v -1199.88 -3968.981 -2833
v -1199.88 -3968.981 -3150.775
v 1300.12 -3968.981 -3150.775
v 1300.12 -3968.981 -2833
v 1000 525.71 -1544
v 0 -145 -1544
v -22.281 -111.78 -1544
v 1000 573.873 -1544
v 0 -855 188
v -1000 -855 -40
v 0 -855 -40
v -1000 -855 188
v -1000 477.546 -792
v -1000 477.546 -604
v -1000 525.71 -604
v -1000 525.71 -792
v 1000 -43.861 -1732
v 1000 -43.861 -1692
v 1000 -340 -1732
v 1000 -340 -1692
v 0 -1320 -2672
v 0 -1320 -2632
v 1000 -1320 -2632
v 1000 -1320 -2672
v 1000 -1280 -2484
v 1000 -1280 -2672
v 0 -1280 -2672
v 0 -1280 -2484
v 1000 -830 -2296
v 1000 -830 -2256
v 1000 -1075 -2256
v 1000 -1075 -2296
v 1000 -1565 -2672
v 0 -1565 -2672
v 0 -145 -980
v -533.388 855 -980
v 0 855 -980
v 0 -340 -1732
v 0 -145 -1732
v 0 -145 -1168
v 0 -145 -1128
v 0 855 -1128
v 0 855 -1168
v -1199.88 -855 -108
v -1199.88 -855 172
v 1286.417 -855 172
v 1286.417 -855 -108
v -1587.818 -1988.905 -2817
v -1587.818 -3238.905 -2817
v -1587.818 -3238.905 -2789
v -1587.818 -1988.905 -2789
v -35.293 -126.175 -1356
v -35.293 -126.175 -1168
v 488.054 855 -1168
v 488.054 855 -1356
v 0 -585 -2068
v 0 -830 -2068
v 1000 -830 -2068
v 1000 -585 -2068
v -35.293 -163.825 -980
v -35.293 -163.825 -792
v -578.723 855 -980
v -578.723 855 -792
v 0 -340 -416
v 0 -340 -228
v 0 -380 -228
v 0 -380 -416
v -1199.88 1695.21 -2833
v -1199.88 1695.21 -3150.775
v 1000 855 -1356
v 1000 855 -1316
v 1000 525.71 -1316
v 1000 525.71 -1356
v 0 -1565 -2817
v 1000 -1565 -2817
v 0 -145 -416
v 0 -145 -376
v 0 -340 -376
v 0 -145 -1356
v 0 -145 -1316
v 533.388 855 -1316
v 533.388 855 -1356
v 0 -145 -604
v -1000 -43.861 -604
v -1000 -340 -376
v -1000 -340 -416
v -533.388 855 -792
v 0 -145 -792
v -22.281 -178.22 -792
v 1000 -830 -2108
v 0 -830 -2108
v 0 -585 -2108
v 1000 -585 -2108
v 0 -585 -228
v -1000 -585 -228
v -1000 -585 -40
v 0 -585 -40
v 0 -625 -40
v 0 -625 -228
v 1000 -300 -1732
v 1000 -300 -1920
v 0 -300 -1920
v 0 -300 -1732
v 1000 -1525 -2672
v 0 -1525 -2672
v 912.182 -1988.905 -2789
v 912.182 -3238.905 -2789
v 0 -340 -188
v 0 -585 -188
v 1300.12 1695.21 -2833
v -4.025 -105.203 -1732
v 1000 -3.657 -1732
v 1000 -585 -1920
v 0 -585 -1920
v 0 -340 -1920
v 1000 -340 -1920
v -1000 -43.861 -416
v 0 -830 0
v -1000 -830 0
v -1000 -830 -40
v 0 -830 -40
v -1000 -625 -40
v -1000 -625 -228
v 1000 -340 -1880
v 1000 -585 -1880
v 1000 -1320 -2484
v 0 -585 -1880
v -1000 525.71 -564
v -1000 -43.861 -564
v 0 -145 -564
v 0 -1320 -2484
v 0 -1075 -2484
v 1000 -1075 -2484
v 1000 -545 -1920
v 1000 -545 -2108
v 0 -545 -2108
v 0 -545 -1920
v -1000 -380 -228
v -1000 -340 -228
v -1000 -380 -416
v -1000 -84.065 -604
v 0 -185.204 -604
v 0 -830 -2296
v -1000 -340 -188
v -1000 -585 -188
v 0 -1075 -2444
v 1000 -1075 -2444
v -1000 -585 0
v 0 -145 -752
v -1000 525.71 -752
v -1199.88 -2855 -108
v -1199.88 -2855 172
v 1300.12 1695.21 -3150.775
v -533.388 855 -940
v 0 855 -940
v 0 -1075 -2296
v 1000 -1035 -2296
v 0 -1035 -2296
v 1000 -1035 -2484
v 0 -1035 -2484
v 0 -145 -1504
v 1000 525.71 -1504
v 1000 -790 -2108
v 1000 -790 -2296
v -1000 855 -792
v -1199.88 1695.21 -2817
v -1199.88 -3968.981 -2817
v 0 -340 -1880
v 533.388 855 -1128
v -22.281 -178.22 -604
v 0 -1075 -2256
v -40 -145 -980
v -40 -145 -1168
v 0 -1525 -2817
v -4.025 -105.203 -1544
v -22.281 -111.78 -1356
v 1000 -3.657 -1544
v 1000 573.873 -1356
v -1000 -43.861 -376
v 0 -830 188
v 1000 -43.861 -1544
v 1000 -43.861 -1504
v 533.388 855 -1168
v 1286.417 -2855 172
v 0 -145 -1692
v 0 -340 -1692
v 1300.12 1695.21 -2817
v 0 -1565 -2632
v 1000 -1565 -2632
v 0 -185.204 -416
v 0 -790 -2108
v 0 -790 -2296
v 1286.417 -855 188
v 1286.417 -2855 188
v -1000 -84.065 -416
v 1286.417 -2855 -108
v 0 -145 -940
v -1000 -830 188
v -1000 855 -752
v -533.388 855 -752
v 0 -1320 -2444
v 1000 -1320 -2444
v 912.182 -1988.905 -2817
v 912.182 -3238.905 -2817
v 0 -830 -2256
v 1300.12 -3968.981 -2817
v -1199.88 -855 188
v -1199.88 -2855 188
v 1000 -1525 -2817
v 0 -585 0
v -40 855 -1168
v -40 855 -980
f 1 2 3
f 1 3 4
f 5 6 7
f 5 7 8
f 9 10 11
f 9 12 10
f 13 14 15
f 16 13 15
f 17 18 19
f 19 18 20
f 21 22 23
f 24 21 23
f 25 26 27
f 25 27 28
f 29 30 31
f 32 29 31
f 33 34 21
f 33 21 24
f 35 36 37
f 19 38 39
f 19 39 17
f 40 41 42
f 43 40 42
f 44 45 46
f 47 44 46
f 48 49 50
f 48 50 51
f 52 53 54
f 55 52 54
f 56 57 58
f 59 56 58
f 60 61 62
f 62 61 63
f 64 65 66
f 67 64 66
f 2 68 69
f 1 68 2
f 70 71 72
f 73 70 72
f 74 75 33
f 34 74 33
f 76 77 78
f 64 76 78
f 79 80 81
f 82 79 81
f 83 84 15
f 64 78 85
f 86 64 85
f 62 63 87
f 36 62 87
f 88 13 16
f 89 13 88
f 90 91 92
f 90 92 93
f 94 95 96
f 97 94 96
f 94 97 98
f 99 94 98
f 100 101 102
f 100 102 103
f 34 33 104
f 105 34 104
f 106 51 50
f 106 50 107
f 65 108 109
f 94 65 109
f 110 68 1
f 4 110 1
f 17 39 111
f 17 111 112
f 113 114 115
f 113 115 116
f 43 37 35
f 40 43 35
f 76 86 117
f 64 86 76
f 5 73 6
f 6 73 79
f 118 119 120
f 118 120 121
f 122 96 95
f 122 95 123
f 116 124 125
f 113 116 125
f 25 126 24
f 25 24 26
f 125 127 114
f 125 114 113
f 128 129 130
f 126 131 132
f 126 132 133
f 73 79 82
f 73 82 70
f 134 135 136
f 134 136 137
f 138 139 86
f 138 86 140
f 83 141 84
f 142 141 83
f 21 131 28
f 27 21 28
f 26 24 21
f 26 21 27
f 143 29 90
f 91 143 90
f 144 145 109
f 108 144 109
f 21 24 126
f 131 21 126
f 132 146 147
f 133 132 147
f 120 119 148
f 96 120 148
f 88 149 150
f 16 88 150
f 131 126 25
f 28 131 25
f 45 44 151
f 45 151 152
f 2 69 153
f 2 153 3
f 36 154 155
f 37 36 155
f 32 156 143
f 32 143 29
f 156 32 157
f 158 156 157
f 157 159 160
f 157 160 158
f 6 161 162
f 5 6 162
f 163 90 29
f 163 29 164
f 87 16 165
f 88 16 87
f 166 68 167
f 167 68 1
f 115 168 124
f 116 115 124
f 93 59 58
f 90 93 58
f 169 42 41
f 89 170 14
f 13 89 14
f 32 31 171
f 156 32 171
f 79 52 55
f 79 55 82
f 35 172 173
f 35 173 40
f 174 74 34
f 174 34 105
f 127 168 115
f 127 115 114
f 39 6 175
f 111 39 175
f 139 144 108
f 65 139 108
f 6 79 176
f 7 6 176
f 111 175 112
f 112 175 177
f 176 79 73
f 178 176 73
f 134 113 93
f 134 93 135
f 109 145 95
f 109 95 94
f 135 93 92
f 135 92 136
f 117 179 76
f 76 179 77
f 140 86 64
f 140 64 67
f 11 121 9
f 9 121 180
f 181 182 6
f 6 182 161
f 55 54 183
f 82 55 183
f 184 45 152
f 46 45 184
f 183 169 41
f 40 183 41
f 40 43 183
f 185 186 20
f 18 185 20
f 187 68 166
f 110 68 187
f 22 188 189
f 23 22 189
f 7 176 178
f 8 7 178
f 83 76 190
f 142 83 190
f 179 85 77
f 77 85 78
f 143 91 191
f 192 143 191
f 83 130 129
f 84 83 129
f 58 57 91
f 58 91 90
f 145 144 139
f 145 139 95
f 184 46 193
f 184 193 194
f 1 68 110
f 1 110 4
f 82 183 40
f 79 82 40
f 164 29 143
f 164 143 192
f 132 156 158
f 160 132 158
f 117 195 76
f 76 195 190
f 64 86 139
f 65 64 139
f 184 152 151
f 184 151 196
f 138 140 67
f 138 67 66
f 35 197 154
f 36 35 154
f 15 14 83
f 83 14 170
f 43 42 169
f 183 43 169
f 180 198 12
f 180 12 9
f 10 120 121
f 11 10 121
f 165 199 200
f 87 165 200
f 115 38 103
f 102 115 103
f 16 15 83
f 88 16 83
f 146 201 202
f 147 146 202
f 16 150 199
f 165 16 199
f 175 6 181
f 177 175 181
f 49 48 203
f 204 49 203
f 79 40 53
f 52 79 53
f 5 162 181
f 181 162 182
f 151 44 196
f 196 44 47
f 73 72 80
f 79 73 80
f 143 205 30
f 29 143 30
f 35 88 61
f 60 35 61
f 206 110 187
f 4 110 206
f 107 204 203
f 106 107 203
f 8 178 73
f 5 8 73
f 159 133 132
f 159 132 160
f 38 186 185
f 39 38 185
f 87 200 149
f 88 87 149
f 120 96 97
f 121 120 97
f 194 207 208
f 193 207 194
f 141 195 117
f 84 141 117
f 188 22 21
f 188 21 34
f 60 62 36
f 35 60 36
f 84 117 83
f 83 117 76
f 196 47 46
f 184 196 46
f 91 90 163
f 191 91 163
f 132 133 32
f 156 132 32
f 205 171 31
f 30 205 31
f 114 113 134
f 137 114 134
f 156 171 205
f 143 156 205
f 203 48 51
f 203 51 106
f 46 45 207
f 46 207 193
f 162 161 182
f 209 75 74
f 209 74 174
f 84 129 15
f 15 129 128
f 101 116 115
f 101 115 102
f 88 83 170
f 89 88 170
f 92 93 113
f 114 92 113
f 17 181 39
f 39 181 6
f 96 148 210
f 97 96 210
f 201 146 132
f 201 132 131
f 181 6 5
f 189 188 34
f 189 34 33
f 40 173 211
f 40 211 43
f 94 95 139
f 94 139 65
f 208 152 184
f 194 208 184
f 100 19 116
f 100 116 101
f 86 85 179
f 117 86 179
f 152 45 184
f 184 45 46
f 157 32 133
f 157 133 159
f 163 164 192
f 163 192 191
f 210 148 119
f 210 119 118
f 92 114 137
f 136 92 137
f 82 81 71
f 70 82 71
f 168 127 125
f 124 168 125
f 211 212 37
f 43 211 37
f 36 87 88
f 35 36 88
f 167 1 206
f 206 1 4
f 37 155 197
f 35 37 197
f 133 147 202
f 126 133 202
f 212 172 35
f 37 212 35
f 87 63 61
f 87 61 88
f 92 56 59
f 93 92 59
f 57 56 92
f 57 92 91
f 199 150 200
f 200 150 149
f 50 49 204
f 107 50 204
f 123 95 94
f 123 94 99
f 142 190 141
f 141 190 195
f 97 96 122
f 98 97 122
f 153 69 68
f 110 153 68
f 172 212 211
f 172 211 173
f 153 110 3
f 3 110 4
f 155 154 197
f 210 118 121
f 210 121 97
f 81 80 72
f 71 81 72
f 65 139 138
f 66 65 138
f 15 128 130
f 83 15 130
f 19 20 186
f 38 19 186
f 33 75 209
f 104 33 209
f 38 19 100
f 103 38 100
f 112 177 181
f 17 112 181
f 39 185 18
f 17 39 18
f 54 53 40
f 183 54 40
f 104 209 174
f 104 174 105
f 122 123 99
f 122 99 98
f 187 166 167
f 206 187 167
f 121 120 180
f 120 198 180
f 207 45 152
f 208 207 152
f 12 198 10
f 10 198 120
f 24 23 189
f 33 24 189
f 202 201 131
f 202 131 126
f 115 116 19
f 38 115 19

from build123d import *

# Parameters (mm, degrees)
F4_W      = 2486.2963052011
F4_H      = 280
F5_DEPTH  = 2000
F6_DEPTH  = 16
F7_W      = 5664.1902506969
F7_H      = 317.7745664499
F8_DEPTH  = 2500
F9_DEPTH  = 16
F2_W      = 1000
F2_H      = 245
F10_DEPTH = 40
F12_W     = 1000
F12_H     = 245
F13_DEPTH = 40
F16_DEPTH = 40
F19_DEPTH = 40
F22_DEPTH = 40
F25_DEPTH = 40
F28_DEPTH = 40
F31_DEPTH = 40
F34_DEPTH = 40
F37_DEPTH = 40
F39_W     = 1000
F39_H     = 245
F40_DEPTH = 40
F42_W     = 1000
F42_H     = 245
F43_DEPTH = 40
F46_DEPTH = 40
F48_W     = 1000
F48_H     = 245
F49_DEPTH = 40
F51_W     = 1000
F51_H     = 245
F52_DEPTH = 40
F53_W     = 1000
F53_H     = 40
F53_H_2   = 188
F54_DEPTH = 25
F55_W     = 40
F55_H     = 188
F56_DEPTH = 1000
F57_W     = 40
F57_H     = 188
F58_DEPTH = 1000
F60_DEPTH = 188
F62_DEPTH = 188
F64_DEPTH = 188
F65_W     = 40
F65_H     = 1000
F66_DEPTH = 188
F68_DEPTH = 188
F70_DEPTH = 188
F72_DEPTH = 188
F73_W     = 40
F73_H     = 188
F74_DEPTH = 1000
F73_H_2   = 145
F75_W     = 2500
F75_H     = 1250
F76_DEPTH = 28


with BuildPart() as f5:
    # F4 (on plane+point) → F5 (new body)
    with BuildSketch(Plane.XZ.offset(855)):
        with Locations((43.2685017586, 32)):
            Rectangle(F4_W, F4_H)
    extrude(amount=F5_DEPTH)


with BuildPart() as f6:
    # F6 (new): a face of the model
    f6_faces = [f5.part.faces().sort_by_distance(p)[0] for p in [
        (43.2685017586, -1855, 172),
    ]]
    extrude(f6_faces, amount=F6_DEPTH)


with BuildPart() as f8:
    # F7 (on face) → F8 (new body)
    with BuildSketch(Plane(origin=(-1199.879650842, 0, 0), x_dir=(0, -1, 0), z_dir=(-1, 0, 0))):
        with Locations((1136.8854641914, -2991.8872832249)):
            Rectangle(F7_W, F7_H)
    extrude(amount=-F8_DEPTH)


with BuildPart() as f9:
    # F9 (new): a face of the model
    f9_faces = [f8.part.faces().sort_by_distance(p)[0] for p in [
        (50.120349158, -1136.8854641914, -2833),
    ]]
    extrude(f9_faces, amount=F9_DEPTH)


with BuildPart() as f10:
    # F2 (on Top) → F10 (new body)
    with BuildSketch(Plane.XY):
        with Locations((-500, -707.5)):
            Rectangle(F2_W, F2_H)
    extrude(amount=-F10_DEPTH)


with BuildPart() as f13:
    # F12 (on offset) → F13 (new body)
    with BuildSketch(Plane(origin=(0, 0, -188), x_dir=(1, 0, 0), z_dir=(0, 0, -1))):
        with Locations((-500, 462.5)):
            Rectangle(F12_W, F12_H)
    extrude(amount=F13_DEPTH)


with BuildPart() as f16:
    # F15 (on offset) → F16 (new body)
    with BuildSketch(Plane(origin=(0, 0, -376), x_dir=(1, 0, 0), z_dir=(0, 0, -1))):
        Polygon((-1000, 340), (-1000, 43.8609200193), (-497.4621748888, 94.6871333065), (0, 145), (0, 340), align=None)
    extrude(amount=F16_DEPTH)


with BuildPart() as f19:
    # F18 (on offset) → F19 (new body)
    with BuildSketch(Plane(origin=(0, 0, -564), x_dir=(1, 0, 0), z_dir=(0, 0, -1))):
        Polygon((-415.248685246, -133.5112733831), (0, 145), (-497.4621748888, 94.6871333065), (-1000, 43.8609200193), (-1000, -525.7095850722), align=None)
    extrude(amount=F19_DEPTH)


with BuildPart() as f22:
    # F21 (on offset) → F22 (new body)
    with BuildSketch(Plane(origin=(0, 0, -752), x_dir=(1, 0, 0), z_dir=(0, 0, -1))):
        Polygon((-415.248685246, -133.5112733831), (-1000, -525.7095850722), (-1000, -855), (-533.3881466372, -855), (-235.3129440856, -296.1664293051), (0, 145), align=None)
    extrude(amount=F22_DEPTH)


with BuildPart() as f25:
    # F24 (on offset) → F25 (new body)
    with BuildSketch(Plane(origin=(0, 0, -940), x_dir=(1, 0, 0), z_dir=(0, 0, -1))):
        Polygon((-533.3881466372, -855), (0, -855), (0, 145), (-235.3129440856, -296.1664293051), align=None)
    extrude(amount=F25_DEPTH)


with BuildPart() as f28:
    # F27 (on offset) → F28 (new body)
    with BuildSketch(Plane(origin=(0, 0, -1128), x_dir=(1, 0, 0), z_dir=(0, 0, -1))):
        Polygon((0, -855), (533.3881466372, -855), (235.3129440856, -296.1664293051), (0, 145), align=None)
    extrude(amount=F28_DEPTH)


with BuildPart() as f31:
    # F30 (on offset) → F31 (new body)
    with BuildSketch(Plane(origin=(0, 0, -1316), x_dir=(1, 0, 0), z_dir=(0, 0, -1))):
        Polygon((415.248685246, -133.5112733831), (0, 145), (235.3129440856, -296.1664293051), (533.3881466372, -855), (1000, -855), (1000, -525.7095850722), align=None)
    extrude(amount=F31_DEPTH)


with BuildPart() as f34:
    # F33 (on offset) → F34 (new body)
    with BuildSketch(Plane(origin=(0, 0, -1504), x_dir=(1, 0, 0), z_dir=(0, 0, -1))):
        Polygon((497.4621748888, 94.6871333065), (0, 145), (415.248685246, -133.5112733831), (1000, -525.7095850722), (1000, 43.8609200193), align=None)
    extrude(amount=F34_DEPTH)


with BuildPart() as f37:
    # F36 (on offset) → F37 (new body)
    with BuildSketch(Plane(origin=(0, 0, -1692), x_dir=(1, 0, 0), z_dir=(0, 0, -1))):
        Polygon((497.4621748888, 94.6871333065), (1000, 43.8609200193), (1000, 340), (0, 340), (0, 145), align=None)
    extrude(amount=F37_DEPTH)


with BuildPart() as f40:
    # F39 (on offset) → F40 (new body)
    with BuildSketch(Plane(origin=(0, 0, -1880), x_dir=(1, 0, 0), z_dir=(0, 0, -1))):
        with Locations((500, 462.5)):
            Rectangle(F39_W, F39_H)
    extrude(amount=F40_DEPTH)


with BuildPart() as f43:
    # F42 (on offset) → F43 (new body)
    with BuildSketch(Plane(origin=(0, 0, -2068), x_dir=(1, 0, 0), z_dir=(0, 0, -1))):
        with Locations((500, 707.5)):
            Rectangle(F42_W, F42_H)
    extrude(amount=F43_DEPTH)


with BuildPart() as f46:
    # F45 (on offset) → F46 (new body)
    with BuildSketch(Plane(origin=(0, 0, -2256), x_dir=(1, 0, 0), z_dir=(0, 0, -1))):
        Polygon((0, 1075), (0, 855), (0, 830), (1000, 830), (1000, 855), (1000, 1075), align=None)
    extrude(amount=F46_DEPTH)


with BuildPart() as f49:
    # F48 (on offset) → F49 (new body)
    with BuildSketch(Plane(origin=(0, 0, -2444), x_dir=(1, 0, 0), z_dir=(0, 0, -1))):
        with Locations((500, 1197.5)):
            Rectangle(F48_W, F48_H)
    extrude(amount=F49_DEPTH)


with BuildPart() as f52:
    # F51 (on offset) → F52 (new body)
    with BuildSketch(Plane(origin=(0, 0, -2632), x_dir=(1, 0, 0), z_dir=(0, 0, -1))):
        with Locations((500, 1442.5)):
            Rectangle(F51_W, F51_H)
    extrude(amount=F52_DEPTH)


with BuildPart() as f54:
    # F53 (on face) → F54 (new body)
    with BuildSketch(Plane.XZ.offset(830)):
        with Locations((-500, -20)):
            Rectangle(F53_W, F53_H)
        with Locations((-500, 94)):
            Rectangle(F53_W, F53_H_2)
    extrude(amount=F54_DEPTH)


with BuildPart() as f56:
    # F55 (on face) → F56 (new body)
    with BuildSketch(Plane(origin=(-1000, 0, 0), x_dir=(0, -1, 0), z_dir=(-1, 0, 0))):
        with Locations((605, -134)):
            Rectangle(F55_W, F55_H)
    extrude(amount=-F56_DEPTH)


with BuildPart() as f58:
    # F57 (on face) → F58 (new body)
    with BuildSketch(Plane(origin=(-1000, 0, 0), x_dir=(0, -1, 0), z_dir=(-1, 0, 0))):
        with Locations((360, -322)):
            Rectangle(F57_W, F57_H)
    extrude(amount=-F58_DEPTH)


with BuildPart() as f60:
    # F59 (on face) → F60 (new body)
    with BuildSketch(Plane(origin=(0, 0, -416), x_dir=(1, 0, 0), z_dir=(0, 0, -1))):
        Polygon((-1000, 43.8609200193), (0, 145), (0, 185.204061755), (-1000, 84.0649817743), align=None)
    extrude(amount=F60_DEPTH)


with BuildPart() as f62:
    # F61 (on face) → F62 (new body)
    with BuildSketch(Plane(origin=(0, 0, -604), x_dir=(1, 0, 0), z_dir=(0, 0, -1))):
        Polygon((-1000, -525.7095850722), (0, 145), (-84.5618037413, 136.4474969681), (-1000, -477.5456758038), align=None)
        Polygon((-84.5618037413, 136.4474969681), (0, 145), (-22.2809018706, 178.2198948197), align=None)
    extrude(amount=F62_DEPTH)


with BuildPart() as f64:
    # F63 (on face) → F64 (new body)
    with BuildSketch(Plane(origin=(0, 0, -792), x_dir=(1, 0, 0), z_dir=(0, 0, -1))):
        Polygon((-533.3881466372, -855), (0, 145), (-70.5866286888, 97.6568715605), (-578.7225117917, -855), align=None)
        Polygon((-70.5866286888, 97.6568715605), (0, 145), (-35.2933143444, 163.8250355268), align=None)
    extrude(amount=F64_DEPTH)


with BuildPart() as f66:
    # F65 (on face) → F66 (new body)
    with BuildSketch(Plane(origin=(0, 0, -980), x_dir=(1, 0, 0), z_dir=(0, 0, -1))):
        with Locations((-20, -355)):
            Rectangle(F65_W, F65_H)
    extrude(amount=F66_DEPTH)


with BuildPart() as f68:
    # F67 (on face) → F68 (new body)
    with BuildSketch(Plane(origin=(0, 0, -1168), x_dir=(1, 0, 0), z_dir=(0, 0, -1))):
        Polygon((533.3881466372, -855), (0, 145), (-35.2933143444, 126.1749644732), (488.0537814828, -855), align=None)
    extrude(amount=F68_DEPTH)


with BuildPart() as f70:
    # F69 (on face) → F70 (new body)
    with BuildSketch(Plane(origin=(0, 0, -1356), x_dir=(1, 0, 0), z_dir=(0, 0, -1))):
        Polygon((1000, -573.8734943406), (1000, -525.7095850722), (0, 145), (-22.2809018706, 111.7801051803), align=None)
    extrude(amount=F70_DEPTH)


with BuildPart() as f72:
    # F71 (on face) → F72 (new body)
    with BuildSketch(Plane(origin=(0, 0, -1544), x_dir=(1, 0, 0), z_dir=(0, 0, -1))):
        Polygon((1000, 3.6568582643), (1000, 43.8609200193), (0, 145), (-4.0250293355, 105.2030260089), align=None)
    extrude(amount=F72_DEPTH)


with BuildPart() as f74:
    # F73 (on face) → F74 (new body)
    with BuildSketch(Plane.YZ.offset(1000)):
        with Locations((-565, -2014)):
            Rectangle(F73_W, F73_H)
    extrude(amount=-F74_DEPTH)


with BuildPart() as f74b:
    # F73 (on face) → F74, piece 2 (new body)
    with BuildSketch(Plane.YZ.offset(1000)):
        with Locations((-810, -2202)):
            Rectangle(F73_W, F73_H)
    extrude(amount=-F74_DEPTH)


with BuildPart() as f74c:
    # F73 (on face) → F74, piece 3 (new body)
    with BuildSketch(Plane.YZ.offset(1000)):
        with Locations((-1055, -2390)):
            Rectangle(F73_W, F73_H)
    extrude(amount=-F74_DEPTH)


with BuildPart() as f74d:
    # F73 (on face) → F74, piece 4 (new body)
    with BuildSketch(Plane.YZ.offset(1000)):
        with Locations((-1300, -2578)):
            Rectangle(F73_W, F73_H)
    extrude(amount=-F74_DEPTH)


with BuildPart() as f74e:
    # F73 (on face) → F74, piece 5 (new body)
    with BuildSketch(Plane.YZ.offset(1000)):
        with Locations((-1545, -2744.5)):
            Rectangle(F73_W, F73_H_2)
    extrude(amount=-F74_DEPTH)


with BuildPart() as f74f:
    # F73 (on face) → F74, piece 6 (new body)
    with BuildSketch(Plane.YZ.offset(1000)):
        with Locations((-320, -1826)):
            Rectangle(F73_W, F73_H)
    extrude(amount=-F74_DEPTH)


with BuildPart() as f76:
    # F75 (on face) → F76 (new body)
    with BuildSketch(Plane.XY.offset(-2817)):
        with Locations((-337.8175497055, -2613.9054298401)):
            Rectangle(F75_W, F75_H)
    extrude(amount=F76_DEPTH)


solid = Compound([f5.part, f6.part, f8.part, f9.part, f10.part, f13.part, f16.part, f19.part, f22.part, f25.part, f28.part, f31.part, f34.part, f37.part, f40.part, f43.part, f46.part, f49.part, f52.part, f54.part, f56.part, f58.part, f60.part, f62.part, f64.part, f66.part, f68.part, f70.part, f72.part, f74.part, f74b.part, f74c.part, f74d.part, f74e.part, f74f.part, f76.part])
